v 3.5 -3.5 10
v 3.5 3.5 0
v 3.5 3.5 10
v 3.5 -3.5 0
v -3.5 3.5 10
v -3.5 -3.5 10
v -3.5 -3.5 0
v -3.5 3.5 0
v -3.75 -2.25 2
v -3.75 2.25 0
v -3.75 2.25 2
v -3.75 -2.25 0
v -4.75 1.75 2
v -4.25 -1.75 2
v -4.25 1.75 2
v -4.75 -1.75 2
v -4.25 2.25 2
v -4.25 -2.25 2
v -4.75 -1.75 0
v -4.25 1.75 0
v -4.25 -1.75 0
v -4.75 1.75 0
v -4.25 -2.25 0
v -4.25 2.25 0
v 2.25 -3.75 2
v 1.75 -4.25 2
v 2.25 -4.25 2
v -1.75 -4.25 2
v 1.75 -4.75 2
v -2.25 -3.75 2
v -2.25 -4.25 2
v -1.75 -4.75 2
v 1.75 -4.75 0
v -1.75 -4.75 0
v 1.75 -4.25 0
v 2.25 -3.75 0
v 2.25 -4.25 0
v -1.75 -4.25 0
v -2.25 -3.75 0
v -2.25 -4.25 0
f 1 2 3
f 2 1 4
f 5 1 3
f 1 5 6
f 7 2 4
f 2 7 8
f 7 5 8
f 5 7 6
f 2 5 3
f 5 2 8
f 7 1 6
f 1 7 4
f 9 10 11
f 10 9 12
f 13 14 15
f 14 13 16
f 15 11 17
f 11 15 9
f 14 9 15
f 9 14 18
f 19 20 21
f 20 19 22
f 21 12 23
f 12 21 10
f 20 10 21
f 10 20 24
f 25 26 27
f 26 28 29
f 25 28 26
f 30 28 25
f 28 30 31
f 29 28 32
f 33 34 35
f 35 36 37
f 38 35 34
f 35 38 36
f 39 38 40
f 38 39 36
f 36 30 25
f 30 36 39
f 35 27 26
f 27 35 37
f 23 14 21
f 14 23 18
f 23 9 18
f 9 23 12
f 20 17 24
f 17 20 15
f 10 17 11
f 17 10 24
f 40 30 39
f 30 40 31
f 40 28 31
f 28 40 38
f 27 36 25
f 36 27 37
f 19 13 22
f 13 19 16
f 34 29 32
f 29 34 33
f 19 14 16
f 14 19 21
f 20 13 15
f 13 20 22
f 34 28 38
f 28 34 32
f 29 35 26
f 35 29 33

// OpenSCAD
translate([0, 0, 5]) color([0,1,0,0.9]) cube([7, 7, 10], center=true);
translate([-4.0, 0.0, 1]) color([1,0,0]) cube([0.5, 0.5, 2], center=true);
translate([0.0, -4.0, 1]) color([1,0,0]) cube([0.5, 0.5, 2], center=true);
translate([-4.0, -0.5, 1]) color([1,0,0]) cube([0.5, 0.5, 2], center=true);
translate([-4.0, 0.5, 1]) color([1,0,0]) cube([0.5, 0.5, 2], center=true);
translate([-0.5, -4.0, 1]) color([1,0,0]) cube([0.5, 0.5, 2], center=true);
translate([0.5, -4.0, 1]) color([1,0,0]) cube([0.5, 0.5, 2], center=true);
translate([-4.0, -1.0, 1]) color([1,0,0]) cube([0.5, 0.5, 2], center=true);
translate([-4.0, 1.0, 1]) color([1,0,0]) cube([0.5, 0.5, 2], center=true);
translate([-1.0, -4.0, 1]) color([1,0,0]) cube([0.5, 0.5, 2], center=true);
translate([1.0, -4.0, 1]) color([1,0,0]) cube([0.5, 0.5, 2], center=true);
translate([-4.0, -1.5, 1]) color([1,0,0]) cube([0.5, 0.5, 2], center=true);
translate([-4.0, 1.5, 1]) color([1,0,0]) cube([0.5, 0.5, 2], center=true);
translate([-1.5, -4.0, 1]) color([1,0,0]) cube([0.5, 0.5, 2], center=true);
translate([1.5, -4.0, 1]) color([1,0,0]) cube([0.5, 0.5, 2], center=true);
translate([-4.0, -2.0, 1]) color([1,0,0]) cube([0.5, 0.5, 2], center=true);
translate([-4.0, 2.0, 1]) color([1,0,0]) cube([0.5, 0.5, 2], center=true);
translate([-2.0, -4.0, 1]) color([1,0,0]) cube([0.5, 0.5, 2], center=true);
translate([2.0, -4.0, 1]) color([1,0,0]) cube([0.5, 0.5, 2], center=true);
translate([-4.5, 0.0, 1]) color([1,0,0]) cube([0.5, 0.5, 2], center=true);
translate([0.0, -4.5, 1]) color([1,0,0]) cube([0.5, 0.5, 2], center=true);
translate([-4.5, -0.5, 1]) color([1,0,0]) cube([0.5, 0.5, 2], center=true);
translate([-4.5, 0.5, 1]) color([1,0,0]) cube([0.5, 0.5, 2], center=true);
translate([-0.5, -4.5, 1]) color([1,0,0]) cube([0.5, 0.5, 2], center=true);
translate([0.5, -4.5, 1]) color([1,0,0]) cube([0.5, 0.5, 2], center=true);
translate([-4.5, -1.0, 1]) color([1,0,0]) cube([0.5, 0.5, 2], center=true);
translate([-4.5, 1.0, 1]) color([1,0,0]) cube([0.5, 0.5, 2], center=true);
translate([-1.0, -4.5, 1]) color([1,0,0]) cube([0.5, 0.5, 2], center=true);
translate([1.0, -4.5, 1]) color([1,0,0]) cube([0.5, 0.5, 2], center=true);
translate([-4.5, -1.5, 1]) color([1,0,0]) cube([0.5, 0.5, 2], center=true);
translate([-4.5, 1.5, 1]) color([1,0,0]) cube([0.5, 0.5, 2], center=true);
translate([-1.5, -4.5, 1]) color([1,0,0]) cube([0.5, 0.5, 2], center=true);
translate([1.5, -4.5, 1]) color([1,0,0]) cube([0.5, 0.5, 2], center=true);
